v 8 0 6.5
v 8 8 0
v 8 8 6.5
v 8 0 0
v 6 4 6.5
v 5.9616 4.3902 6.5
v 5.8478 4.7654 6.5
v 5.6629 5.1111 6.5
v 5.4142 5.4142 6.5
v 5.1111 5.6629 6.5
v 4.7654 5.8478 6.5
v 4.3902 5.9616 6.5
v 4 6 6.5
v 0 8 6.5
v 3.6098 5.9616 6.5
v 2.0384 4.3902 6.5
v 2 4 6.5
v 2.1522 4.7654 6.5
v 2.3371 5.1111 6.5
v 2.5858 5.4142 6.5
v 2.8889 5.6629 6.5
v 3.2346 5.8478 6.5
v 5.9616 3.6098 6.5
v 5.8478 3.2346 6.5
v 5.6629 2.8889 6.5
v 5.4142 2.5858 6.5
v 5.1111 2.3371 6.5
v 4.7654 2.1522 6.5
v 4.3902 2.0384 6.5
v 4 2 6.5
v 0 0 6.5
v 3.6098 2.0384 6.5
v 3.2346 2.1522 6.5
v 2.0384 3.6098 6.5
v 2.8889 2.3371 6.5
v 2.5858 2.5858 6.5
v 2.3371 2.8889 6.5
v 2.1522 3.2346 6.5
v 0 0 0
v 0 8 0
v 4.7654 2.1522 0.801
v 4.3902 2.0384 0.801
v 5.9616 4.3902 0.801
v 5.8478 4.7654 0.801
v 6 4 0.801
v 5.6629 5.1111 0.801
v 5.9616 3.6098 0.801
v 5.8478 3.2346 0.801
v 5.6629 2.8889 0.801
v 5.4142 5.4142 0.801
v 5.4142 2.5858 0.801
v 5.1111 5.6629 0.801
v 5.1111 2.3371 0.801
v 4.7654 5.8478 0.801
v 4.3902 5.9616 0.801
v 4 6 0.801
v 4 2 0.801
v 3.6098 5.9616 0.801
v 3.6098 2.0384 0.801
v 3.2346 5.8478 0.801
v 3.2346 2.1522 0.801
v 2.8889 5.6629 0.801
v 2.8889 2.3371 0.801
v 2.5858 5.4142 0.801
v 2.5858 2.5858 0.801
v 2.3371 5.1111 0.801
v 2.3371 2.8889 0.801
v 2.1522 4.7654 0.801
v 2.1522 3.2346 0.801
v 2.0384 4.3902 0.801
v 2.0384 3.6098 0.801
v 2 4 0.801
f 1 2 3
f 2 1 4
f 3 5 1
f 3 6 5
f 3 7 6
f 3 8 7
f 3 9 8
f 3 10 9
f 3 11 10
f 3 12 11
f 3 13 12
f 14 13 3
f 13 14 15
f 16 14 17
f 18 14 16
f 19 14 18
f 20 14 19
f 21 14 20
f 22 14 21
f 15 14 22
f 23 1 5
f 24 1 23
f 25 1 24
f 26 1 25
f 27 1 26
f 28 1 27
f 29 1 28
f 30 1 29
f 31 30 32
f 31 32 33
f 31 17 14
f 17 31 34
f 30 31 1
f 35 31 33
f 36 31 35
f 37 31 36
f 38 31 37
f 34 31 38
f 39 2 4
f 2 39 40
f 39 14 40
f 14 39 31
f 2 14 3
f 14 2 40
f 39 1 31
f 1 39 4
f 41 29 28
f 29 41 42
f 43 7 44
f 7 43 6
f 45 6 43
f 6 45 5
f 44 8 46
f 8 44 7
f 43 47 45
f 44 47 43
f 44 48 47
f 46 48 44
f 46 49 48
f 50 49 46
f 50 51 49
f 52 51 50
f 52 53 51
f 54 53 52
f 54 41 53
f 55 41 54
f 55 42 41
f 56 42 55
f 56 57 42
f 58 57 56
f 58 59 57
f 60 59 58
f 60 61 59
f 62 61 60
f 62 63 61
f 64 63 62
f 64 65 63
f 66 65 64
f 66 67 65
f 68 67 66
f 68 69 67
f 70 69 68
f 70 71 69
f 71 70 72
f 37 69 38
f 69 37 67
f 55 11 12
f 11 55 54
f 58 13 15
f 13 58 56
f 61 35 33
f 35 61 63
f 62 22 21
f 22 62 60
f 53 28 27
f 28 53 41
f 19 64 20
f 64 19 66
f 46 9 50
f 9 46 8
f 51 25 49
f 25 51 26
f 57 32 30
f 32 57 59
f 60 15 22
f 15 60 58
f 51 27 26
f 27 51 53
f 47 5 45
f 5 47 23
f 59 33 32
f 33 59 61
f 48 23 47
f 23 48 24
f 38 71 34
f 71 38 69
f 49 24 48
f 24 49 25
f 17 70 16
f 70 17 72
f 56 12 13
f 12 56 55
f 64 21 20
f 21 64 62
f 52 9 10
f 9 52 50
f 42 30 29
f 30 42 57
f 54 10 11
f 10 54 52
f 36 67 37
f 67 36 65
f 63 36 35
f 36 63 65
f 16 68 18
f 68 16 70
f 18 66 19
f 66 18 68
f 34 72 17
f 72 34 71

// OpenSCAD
// file: cyl_00.scad
// -----------------------------------------------------------------------------
// 3D-Module (OpenSCAD) of non-centered cylinder
//
// Author: Bernhard Bablok
// License: GPL3
//
// Website: https://github.com/bablokb/pi-webradio
//
// -----------------------------------------------------------------------------


module cyl_00(h,d,plane="xy") {
  r00 = d/2.0;
  if (plane == "xy")
    translate([r00,r00,0]) cylinder(h=h,r=r00,center=false);
  else if (plane == "yz")
    translate([0,h,0]) rotate([90,0,0]) cyl_00(h,d);
  else if (plane == "xz")
    translate([r00,0,r00]) rotate([-90,0,0]) cylinder(h=h,r=r00,center=false);
}
// main file
// -----------------------------------------------------------------------------
// 3D-Model (OpenSCAD) of thread-pocket
//
// Author: Bernhard Bablok
// License: GPL3
//
// Website: https://github.com/bablokb/pi-webradio
//
// -----------------------------------------------------------------------------

$fa = 1;
$fs = 0.4;

fuzz = 0.001;

use <cyl_00.scad>

module thread_pocket() {
  p_x = 8;            // dimensions of outer cube
  p_y = 8;
  p_z = 6.5;
  c_d = 4;            // diameter pocket
  c_z = 5.7;          // height pocket

  difference() {
    cube([p_x,p_y,p_z]);
    translate([(p_x-c_d)/2,(p_y-c_d)/2,p_z-c_z+fuzz]) cyl_00(d=c_d,h=c_z+fuzz,plane="xy");
  }
}
thread_pocket();
